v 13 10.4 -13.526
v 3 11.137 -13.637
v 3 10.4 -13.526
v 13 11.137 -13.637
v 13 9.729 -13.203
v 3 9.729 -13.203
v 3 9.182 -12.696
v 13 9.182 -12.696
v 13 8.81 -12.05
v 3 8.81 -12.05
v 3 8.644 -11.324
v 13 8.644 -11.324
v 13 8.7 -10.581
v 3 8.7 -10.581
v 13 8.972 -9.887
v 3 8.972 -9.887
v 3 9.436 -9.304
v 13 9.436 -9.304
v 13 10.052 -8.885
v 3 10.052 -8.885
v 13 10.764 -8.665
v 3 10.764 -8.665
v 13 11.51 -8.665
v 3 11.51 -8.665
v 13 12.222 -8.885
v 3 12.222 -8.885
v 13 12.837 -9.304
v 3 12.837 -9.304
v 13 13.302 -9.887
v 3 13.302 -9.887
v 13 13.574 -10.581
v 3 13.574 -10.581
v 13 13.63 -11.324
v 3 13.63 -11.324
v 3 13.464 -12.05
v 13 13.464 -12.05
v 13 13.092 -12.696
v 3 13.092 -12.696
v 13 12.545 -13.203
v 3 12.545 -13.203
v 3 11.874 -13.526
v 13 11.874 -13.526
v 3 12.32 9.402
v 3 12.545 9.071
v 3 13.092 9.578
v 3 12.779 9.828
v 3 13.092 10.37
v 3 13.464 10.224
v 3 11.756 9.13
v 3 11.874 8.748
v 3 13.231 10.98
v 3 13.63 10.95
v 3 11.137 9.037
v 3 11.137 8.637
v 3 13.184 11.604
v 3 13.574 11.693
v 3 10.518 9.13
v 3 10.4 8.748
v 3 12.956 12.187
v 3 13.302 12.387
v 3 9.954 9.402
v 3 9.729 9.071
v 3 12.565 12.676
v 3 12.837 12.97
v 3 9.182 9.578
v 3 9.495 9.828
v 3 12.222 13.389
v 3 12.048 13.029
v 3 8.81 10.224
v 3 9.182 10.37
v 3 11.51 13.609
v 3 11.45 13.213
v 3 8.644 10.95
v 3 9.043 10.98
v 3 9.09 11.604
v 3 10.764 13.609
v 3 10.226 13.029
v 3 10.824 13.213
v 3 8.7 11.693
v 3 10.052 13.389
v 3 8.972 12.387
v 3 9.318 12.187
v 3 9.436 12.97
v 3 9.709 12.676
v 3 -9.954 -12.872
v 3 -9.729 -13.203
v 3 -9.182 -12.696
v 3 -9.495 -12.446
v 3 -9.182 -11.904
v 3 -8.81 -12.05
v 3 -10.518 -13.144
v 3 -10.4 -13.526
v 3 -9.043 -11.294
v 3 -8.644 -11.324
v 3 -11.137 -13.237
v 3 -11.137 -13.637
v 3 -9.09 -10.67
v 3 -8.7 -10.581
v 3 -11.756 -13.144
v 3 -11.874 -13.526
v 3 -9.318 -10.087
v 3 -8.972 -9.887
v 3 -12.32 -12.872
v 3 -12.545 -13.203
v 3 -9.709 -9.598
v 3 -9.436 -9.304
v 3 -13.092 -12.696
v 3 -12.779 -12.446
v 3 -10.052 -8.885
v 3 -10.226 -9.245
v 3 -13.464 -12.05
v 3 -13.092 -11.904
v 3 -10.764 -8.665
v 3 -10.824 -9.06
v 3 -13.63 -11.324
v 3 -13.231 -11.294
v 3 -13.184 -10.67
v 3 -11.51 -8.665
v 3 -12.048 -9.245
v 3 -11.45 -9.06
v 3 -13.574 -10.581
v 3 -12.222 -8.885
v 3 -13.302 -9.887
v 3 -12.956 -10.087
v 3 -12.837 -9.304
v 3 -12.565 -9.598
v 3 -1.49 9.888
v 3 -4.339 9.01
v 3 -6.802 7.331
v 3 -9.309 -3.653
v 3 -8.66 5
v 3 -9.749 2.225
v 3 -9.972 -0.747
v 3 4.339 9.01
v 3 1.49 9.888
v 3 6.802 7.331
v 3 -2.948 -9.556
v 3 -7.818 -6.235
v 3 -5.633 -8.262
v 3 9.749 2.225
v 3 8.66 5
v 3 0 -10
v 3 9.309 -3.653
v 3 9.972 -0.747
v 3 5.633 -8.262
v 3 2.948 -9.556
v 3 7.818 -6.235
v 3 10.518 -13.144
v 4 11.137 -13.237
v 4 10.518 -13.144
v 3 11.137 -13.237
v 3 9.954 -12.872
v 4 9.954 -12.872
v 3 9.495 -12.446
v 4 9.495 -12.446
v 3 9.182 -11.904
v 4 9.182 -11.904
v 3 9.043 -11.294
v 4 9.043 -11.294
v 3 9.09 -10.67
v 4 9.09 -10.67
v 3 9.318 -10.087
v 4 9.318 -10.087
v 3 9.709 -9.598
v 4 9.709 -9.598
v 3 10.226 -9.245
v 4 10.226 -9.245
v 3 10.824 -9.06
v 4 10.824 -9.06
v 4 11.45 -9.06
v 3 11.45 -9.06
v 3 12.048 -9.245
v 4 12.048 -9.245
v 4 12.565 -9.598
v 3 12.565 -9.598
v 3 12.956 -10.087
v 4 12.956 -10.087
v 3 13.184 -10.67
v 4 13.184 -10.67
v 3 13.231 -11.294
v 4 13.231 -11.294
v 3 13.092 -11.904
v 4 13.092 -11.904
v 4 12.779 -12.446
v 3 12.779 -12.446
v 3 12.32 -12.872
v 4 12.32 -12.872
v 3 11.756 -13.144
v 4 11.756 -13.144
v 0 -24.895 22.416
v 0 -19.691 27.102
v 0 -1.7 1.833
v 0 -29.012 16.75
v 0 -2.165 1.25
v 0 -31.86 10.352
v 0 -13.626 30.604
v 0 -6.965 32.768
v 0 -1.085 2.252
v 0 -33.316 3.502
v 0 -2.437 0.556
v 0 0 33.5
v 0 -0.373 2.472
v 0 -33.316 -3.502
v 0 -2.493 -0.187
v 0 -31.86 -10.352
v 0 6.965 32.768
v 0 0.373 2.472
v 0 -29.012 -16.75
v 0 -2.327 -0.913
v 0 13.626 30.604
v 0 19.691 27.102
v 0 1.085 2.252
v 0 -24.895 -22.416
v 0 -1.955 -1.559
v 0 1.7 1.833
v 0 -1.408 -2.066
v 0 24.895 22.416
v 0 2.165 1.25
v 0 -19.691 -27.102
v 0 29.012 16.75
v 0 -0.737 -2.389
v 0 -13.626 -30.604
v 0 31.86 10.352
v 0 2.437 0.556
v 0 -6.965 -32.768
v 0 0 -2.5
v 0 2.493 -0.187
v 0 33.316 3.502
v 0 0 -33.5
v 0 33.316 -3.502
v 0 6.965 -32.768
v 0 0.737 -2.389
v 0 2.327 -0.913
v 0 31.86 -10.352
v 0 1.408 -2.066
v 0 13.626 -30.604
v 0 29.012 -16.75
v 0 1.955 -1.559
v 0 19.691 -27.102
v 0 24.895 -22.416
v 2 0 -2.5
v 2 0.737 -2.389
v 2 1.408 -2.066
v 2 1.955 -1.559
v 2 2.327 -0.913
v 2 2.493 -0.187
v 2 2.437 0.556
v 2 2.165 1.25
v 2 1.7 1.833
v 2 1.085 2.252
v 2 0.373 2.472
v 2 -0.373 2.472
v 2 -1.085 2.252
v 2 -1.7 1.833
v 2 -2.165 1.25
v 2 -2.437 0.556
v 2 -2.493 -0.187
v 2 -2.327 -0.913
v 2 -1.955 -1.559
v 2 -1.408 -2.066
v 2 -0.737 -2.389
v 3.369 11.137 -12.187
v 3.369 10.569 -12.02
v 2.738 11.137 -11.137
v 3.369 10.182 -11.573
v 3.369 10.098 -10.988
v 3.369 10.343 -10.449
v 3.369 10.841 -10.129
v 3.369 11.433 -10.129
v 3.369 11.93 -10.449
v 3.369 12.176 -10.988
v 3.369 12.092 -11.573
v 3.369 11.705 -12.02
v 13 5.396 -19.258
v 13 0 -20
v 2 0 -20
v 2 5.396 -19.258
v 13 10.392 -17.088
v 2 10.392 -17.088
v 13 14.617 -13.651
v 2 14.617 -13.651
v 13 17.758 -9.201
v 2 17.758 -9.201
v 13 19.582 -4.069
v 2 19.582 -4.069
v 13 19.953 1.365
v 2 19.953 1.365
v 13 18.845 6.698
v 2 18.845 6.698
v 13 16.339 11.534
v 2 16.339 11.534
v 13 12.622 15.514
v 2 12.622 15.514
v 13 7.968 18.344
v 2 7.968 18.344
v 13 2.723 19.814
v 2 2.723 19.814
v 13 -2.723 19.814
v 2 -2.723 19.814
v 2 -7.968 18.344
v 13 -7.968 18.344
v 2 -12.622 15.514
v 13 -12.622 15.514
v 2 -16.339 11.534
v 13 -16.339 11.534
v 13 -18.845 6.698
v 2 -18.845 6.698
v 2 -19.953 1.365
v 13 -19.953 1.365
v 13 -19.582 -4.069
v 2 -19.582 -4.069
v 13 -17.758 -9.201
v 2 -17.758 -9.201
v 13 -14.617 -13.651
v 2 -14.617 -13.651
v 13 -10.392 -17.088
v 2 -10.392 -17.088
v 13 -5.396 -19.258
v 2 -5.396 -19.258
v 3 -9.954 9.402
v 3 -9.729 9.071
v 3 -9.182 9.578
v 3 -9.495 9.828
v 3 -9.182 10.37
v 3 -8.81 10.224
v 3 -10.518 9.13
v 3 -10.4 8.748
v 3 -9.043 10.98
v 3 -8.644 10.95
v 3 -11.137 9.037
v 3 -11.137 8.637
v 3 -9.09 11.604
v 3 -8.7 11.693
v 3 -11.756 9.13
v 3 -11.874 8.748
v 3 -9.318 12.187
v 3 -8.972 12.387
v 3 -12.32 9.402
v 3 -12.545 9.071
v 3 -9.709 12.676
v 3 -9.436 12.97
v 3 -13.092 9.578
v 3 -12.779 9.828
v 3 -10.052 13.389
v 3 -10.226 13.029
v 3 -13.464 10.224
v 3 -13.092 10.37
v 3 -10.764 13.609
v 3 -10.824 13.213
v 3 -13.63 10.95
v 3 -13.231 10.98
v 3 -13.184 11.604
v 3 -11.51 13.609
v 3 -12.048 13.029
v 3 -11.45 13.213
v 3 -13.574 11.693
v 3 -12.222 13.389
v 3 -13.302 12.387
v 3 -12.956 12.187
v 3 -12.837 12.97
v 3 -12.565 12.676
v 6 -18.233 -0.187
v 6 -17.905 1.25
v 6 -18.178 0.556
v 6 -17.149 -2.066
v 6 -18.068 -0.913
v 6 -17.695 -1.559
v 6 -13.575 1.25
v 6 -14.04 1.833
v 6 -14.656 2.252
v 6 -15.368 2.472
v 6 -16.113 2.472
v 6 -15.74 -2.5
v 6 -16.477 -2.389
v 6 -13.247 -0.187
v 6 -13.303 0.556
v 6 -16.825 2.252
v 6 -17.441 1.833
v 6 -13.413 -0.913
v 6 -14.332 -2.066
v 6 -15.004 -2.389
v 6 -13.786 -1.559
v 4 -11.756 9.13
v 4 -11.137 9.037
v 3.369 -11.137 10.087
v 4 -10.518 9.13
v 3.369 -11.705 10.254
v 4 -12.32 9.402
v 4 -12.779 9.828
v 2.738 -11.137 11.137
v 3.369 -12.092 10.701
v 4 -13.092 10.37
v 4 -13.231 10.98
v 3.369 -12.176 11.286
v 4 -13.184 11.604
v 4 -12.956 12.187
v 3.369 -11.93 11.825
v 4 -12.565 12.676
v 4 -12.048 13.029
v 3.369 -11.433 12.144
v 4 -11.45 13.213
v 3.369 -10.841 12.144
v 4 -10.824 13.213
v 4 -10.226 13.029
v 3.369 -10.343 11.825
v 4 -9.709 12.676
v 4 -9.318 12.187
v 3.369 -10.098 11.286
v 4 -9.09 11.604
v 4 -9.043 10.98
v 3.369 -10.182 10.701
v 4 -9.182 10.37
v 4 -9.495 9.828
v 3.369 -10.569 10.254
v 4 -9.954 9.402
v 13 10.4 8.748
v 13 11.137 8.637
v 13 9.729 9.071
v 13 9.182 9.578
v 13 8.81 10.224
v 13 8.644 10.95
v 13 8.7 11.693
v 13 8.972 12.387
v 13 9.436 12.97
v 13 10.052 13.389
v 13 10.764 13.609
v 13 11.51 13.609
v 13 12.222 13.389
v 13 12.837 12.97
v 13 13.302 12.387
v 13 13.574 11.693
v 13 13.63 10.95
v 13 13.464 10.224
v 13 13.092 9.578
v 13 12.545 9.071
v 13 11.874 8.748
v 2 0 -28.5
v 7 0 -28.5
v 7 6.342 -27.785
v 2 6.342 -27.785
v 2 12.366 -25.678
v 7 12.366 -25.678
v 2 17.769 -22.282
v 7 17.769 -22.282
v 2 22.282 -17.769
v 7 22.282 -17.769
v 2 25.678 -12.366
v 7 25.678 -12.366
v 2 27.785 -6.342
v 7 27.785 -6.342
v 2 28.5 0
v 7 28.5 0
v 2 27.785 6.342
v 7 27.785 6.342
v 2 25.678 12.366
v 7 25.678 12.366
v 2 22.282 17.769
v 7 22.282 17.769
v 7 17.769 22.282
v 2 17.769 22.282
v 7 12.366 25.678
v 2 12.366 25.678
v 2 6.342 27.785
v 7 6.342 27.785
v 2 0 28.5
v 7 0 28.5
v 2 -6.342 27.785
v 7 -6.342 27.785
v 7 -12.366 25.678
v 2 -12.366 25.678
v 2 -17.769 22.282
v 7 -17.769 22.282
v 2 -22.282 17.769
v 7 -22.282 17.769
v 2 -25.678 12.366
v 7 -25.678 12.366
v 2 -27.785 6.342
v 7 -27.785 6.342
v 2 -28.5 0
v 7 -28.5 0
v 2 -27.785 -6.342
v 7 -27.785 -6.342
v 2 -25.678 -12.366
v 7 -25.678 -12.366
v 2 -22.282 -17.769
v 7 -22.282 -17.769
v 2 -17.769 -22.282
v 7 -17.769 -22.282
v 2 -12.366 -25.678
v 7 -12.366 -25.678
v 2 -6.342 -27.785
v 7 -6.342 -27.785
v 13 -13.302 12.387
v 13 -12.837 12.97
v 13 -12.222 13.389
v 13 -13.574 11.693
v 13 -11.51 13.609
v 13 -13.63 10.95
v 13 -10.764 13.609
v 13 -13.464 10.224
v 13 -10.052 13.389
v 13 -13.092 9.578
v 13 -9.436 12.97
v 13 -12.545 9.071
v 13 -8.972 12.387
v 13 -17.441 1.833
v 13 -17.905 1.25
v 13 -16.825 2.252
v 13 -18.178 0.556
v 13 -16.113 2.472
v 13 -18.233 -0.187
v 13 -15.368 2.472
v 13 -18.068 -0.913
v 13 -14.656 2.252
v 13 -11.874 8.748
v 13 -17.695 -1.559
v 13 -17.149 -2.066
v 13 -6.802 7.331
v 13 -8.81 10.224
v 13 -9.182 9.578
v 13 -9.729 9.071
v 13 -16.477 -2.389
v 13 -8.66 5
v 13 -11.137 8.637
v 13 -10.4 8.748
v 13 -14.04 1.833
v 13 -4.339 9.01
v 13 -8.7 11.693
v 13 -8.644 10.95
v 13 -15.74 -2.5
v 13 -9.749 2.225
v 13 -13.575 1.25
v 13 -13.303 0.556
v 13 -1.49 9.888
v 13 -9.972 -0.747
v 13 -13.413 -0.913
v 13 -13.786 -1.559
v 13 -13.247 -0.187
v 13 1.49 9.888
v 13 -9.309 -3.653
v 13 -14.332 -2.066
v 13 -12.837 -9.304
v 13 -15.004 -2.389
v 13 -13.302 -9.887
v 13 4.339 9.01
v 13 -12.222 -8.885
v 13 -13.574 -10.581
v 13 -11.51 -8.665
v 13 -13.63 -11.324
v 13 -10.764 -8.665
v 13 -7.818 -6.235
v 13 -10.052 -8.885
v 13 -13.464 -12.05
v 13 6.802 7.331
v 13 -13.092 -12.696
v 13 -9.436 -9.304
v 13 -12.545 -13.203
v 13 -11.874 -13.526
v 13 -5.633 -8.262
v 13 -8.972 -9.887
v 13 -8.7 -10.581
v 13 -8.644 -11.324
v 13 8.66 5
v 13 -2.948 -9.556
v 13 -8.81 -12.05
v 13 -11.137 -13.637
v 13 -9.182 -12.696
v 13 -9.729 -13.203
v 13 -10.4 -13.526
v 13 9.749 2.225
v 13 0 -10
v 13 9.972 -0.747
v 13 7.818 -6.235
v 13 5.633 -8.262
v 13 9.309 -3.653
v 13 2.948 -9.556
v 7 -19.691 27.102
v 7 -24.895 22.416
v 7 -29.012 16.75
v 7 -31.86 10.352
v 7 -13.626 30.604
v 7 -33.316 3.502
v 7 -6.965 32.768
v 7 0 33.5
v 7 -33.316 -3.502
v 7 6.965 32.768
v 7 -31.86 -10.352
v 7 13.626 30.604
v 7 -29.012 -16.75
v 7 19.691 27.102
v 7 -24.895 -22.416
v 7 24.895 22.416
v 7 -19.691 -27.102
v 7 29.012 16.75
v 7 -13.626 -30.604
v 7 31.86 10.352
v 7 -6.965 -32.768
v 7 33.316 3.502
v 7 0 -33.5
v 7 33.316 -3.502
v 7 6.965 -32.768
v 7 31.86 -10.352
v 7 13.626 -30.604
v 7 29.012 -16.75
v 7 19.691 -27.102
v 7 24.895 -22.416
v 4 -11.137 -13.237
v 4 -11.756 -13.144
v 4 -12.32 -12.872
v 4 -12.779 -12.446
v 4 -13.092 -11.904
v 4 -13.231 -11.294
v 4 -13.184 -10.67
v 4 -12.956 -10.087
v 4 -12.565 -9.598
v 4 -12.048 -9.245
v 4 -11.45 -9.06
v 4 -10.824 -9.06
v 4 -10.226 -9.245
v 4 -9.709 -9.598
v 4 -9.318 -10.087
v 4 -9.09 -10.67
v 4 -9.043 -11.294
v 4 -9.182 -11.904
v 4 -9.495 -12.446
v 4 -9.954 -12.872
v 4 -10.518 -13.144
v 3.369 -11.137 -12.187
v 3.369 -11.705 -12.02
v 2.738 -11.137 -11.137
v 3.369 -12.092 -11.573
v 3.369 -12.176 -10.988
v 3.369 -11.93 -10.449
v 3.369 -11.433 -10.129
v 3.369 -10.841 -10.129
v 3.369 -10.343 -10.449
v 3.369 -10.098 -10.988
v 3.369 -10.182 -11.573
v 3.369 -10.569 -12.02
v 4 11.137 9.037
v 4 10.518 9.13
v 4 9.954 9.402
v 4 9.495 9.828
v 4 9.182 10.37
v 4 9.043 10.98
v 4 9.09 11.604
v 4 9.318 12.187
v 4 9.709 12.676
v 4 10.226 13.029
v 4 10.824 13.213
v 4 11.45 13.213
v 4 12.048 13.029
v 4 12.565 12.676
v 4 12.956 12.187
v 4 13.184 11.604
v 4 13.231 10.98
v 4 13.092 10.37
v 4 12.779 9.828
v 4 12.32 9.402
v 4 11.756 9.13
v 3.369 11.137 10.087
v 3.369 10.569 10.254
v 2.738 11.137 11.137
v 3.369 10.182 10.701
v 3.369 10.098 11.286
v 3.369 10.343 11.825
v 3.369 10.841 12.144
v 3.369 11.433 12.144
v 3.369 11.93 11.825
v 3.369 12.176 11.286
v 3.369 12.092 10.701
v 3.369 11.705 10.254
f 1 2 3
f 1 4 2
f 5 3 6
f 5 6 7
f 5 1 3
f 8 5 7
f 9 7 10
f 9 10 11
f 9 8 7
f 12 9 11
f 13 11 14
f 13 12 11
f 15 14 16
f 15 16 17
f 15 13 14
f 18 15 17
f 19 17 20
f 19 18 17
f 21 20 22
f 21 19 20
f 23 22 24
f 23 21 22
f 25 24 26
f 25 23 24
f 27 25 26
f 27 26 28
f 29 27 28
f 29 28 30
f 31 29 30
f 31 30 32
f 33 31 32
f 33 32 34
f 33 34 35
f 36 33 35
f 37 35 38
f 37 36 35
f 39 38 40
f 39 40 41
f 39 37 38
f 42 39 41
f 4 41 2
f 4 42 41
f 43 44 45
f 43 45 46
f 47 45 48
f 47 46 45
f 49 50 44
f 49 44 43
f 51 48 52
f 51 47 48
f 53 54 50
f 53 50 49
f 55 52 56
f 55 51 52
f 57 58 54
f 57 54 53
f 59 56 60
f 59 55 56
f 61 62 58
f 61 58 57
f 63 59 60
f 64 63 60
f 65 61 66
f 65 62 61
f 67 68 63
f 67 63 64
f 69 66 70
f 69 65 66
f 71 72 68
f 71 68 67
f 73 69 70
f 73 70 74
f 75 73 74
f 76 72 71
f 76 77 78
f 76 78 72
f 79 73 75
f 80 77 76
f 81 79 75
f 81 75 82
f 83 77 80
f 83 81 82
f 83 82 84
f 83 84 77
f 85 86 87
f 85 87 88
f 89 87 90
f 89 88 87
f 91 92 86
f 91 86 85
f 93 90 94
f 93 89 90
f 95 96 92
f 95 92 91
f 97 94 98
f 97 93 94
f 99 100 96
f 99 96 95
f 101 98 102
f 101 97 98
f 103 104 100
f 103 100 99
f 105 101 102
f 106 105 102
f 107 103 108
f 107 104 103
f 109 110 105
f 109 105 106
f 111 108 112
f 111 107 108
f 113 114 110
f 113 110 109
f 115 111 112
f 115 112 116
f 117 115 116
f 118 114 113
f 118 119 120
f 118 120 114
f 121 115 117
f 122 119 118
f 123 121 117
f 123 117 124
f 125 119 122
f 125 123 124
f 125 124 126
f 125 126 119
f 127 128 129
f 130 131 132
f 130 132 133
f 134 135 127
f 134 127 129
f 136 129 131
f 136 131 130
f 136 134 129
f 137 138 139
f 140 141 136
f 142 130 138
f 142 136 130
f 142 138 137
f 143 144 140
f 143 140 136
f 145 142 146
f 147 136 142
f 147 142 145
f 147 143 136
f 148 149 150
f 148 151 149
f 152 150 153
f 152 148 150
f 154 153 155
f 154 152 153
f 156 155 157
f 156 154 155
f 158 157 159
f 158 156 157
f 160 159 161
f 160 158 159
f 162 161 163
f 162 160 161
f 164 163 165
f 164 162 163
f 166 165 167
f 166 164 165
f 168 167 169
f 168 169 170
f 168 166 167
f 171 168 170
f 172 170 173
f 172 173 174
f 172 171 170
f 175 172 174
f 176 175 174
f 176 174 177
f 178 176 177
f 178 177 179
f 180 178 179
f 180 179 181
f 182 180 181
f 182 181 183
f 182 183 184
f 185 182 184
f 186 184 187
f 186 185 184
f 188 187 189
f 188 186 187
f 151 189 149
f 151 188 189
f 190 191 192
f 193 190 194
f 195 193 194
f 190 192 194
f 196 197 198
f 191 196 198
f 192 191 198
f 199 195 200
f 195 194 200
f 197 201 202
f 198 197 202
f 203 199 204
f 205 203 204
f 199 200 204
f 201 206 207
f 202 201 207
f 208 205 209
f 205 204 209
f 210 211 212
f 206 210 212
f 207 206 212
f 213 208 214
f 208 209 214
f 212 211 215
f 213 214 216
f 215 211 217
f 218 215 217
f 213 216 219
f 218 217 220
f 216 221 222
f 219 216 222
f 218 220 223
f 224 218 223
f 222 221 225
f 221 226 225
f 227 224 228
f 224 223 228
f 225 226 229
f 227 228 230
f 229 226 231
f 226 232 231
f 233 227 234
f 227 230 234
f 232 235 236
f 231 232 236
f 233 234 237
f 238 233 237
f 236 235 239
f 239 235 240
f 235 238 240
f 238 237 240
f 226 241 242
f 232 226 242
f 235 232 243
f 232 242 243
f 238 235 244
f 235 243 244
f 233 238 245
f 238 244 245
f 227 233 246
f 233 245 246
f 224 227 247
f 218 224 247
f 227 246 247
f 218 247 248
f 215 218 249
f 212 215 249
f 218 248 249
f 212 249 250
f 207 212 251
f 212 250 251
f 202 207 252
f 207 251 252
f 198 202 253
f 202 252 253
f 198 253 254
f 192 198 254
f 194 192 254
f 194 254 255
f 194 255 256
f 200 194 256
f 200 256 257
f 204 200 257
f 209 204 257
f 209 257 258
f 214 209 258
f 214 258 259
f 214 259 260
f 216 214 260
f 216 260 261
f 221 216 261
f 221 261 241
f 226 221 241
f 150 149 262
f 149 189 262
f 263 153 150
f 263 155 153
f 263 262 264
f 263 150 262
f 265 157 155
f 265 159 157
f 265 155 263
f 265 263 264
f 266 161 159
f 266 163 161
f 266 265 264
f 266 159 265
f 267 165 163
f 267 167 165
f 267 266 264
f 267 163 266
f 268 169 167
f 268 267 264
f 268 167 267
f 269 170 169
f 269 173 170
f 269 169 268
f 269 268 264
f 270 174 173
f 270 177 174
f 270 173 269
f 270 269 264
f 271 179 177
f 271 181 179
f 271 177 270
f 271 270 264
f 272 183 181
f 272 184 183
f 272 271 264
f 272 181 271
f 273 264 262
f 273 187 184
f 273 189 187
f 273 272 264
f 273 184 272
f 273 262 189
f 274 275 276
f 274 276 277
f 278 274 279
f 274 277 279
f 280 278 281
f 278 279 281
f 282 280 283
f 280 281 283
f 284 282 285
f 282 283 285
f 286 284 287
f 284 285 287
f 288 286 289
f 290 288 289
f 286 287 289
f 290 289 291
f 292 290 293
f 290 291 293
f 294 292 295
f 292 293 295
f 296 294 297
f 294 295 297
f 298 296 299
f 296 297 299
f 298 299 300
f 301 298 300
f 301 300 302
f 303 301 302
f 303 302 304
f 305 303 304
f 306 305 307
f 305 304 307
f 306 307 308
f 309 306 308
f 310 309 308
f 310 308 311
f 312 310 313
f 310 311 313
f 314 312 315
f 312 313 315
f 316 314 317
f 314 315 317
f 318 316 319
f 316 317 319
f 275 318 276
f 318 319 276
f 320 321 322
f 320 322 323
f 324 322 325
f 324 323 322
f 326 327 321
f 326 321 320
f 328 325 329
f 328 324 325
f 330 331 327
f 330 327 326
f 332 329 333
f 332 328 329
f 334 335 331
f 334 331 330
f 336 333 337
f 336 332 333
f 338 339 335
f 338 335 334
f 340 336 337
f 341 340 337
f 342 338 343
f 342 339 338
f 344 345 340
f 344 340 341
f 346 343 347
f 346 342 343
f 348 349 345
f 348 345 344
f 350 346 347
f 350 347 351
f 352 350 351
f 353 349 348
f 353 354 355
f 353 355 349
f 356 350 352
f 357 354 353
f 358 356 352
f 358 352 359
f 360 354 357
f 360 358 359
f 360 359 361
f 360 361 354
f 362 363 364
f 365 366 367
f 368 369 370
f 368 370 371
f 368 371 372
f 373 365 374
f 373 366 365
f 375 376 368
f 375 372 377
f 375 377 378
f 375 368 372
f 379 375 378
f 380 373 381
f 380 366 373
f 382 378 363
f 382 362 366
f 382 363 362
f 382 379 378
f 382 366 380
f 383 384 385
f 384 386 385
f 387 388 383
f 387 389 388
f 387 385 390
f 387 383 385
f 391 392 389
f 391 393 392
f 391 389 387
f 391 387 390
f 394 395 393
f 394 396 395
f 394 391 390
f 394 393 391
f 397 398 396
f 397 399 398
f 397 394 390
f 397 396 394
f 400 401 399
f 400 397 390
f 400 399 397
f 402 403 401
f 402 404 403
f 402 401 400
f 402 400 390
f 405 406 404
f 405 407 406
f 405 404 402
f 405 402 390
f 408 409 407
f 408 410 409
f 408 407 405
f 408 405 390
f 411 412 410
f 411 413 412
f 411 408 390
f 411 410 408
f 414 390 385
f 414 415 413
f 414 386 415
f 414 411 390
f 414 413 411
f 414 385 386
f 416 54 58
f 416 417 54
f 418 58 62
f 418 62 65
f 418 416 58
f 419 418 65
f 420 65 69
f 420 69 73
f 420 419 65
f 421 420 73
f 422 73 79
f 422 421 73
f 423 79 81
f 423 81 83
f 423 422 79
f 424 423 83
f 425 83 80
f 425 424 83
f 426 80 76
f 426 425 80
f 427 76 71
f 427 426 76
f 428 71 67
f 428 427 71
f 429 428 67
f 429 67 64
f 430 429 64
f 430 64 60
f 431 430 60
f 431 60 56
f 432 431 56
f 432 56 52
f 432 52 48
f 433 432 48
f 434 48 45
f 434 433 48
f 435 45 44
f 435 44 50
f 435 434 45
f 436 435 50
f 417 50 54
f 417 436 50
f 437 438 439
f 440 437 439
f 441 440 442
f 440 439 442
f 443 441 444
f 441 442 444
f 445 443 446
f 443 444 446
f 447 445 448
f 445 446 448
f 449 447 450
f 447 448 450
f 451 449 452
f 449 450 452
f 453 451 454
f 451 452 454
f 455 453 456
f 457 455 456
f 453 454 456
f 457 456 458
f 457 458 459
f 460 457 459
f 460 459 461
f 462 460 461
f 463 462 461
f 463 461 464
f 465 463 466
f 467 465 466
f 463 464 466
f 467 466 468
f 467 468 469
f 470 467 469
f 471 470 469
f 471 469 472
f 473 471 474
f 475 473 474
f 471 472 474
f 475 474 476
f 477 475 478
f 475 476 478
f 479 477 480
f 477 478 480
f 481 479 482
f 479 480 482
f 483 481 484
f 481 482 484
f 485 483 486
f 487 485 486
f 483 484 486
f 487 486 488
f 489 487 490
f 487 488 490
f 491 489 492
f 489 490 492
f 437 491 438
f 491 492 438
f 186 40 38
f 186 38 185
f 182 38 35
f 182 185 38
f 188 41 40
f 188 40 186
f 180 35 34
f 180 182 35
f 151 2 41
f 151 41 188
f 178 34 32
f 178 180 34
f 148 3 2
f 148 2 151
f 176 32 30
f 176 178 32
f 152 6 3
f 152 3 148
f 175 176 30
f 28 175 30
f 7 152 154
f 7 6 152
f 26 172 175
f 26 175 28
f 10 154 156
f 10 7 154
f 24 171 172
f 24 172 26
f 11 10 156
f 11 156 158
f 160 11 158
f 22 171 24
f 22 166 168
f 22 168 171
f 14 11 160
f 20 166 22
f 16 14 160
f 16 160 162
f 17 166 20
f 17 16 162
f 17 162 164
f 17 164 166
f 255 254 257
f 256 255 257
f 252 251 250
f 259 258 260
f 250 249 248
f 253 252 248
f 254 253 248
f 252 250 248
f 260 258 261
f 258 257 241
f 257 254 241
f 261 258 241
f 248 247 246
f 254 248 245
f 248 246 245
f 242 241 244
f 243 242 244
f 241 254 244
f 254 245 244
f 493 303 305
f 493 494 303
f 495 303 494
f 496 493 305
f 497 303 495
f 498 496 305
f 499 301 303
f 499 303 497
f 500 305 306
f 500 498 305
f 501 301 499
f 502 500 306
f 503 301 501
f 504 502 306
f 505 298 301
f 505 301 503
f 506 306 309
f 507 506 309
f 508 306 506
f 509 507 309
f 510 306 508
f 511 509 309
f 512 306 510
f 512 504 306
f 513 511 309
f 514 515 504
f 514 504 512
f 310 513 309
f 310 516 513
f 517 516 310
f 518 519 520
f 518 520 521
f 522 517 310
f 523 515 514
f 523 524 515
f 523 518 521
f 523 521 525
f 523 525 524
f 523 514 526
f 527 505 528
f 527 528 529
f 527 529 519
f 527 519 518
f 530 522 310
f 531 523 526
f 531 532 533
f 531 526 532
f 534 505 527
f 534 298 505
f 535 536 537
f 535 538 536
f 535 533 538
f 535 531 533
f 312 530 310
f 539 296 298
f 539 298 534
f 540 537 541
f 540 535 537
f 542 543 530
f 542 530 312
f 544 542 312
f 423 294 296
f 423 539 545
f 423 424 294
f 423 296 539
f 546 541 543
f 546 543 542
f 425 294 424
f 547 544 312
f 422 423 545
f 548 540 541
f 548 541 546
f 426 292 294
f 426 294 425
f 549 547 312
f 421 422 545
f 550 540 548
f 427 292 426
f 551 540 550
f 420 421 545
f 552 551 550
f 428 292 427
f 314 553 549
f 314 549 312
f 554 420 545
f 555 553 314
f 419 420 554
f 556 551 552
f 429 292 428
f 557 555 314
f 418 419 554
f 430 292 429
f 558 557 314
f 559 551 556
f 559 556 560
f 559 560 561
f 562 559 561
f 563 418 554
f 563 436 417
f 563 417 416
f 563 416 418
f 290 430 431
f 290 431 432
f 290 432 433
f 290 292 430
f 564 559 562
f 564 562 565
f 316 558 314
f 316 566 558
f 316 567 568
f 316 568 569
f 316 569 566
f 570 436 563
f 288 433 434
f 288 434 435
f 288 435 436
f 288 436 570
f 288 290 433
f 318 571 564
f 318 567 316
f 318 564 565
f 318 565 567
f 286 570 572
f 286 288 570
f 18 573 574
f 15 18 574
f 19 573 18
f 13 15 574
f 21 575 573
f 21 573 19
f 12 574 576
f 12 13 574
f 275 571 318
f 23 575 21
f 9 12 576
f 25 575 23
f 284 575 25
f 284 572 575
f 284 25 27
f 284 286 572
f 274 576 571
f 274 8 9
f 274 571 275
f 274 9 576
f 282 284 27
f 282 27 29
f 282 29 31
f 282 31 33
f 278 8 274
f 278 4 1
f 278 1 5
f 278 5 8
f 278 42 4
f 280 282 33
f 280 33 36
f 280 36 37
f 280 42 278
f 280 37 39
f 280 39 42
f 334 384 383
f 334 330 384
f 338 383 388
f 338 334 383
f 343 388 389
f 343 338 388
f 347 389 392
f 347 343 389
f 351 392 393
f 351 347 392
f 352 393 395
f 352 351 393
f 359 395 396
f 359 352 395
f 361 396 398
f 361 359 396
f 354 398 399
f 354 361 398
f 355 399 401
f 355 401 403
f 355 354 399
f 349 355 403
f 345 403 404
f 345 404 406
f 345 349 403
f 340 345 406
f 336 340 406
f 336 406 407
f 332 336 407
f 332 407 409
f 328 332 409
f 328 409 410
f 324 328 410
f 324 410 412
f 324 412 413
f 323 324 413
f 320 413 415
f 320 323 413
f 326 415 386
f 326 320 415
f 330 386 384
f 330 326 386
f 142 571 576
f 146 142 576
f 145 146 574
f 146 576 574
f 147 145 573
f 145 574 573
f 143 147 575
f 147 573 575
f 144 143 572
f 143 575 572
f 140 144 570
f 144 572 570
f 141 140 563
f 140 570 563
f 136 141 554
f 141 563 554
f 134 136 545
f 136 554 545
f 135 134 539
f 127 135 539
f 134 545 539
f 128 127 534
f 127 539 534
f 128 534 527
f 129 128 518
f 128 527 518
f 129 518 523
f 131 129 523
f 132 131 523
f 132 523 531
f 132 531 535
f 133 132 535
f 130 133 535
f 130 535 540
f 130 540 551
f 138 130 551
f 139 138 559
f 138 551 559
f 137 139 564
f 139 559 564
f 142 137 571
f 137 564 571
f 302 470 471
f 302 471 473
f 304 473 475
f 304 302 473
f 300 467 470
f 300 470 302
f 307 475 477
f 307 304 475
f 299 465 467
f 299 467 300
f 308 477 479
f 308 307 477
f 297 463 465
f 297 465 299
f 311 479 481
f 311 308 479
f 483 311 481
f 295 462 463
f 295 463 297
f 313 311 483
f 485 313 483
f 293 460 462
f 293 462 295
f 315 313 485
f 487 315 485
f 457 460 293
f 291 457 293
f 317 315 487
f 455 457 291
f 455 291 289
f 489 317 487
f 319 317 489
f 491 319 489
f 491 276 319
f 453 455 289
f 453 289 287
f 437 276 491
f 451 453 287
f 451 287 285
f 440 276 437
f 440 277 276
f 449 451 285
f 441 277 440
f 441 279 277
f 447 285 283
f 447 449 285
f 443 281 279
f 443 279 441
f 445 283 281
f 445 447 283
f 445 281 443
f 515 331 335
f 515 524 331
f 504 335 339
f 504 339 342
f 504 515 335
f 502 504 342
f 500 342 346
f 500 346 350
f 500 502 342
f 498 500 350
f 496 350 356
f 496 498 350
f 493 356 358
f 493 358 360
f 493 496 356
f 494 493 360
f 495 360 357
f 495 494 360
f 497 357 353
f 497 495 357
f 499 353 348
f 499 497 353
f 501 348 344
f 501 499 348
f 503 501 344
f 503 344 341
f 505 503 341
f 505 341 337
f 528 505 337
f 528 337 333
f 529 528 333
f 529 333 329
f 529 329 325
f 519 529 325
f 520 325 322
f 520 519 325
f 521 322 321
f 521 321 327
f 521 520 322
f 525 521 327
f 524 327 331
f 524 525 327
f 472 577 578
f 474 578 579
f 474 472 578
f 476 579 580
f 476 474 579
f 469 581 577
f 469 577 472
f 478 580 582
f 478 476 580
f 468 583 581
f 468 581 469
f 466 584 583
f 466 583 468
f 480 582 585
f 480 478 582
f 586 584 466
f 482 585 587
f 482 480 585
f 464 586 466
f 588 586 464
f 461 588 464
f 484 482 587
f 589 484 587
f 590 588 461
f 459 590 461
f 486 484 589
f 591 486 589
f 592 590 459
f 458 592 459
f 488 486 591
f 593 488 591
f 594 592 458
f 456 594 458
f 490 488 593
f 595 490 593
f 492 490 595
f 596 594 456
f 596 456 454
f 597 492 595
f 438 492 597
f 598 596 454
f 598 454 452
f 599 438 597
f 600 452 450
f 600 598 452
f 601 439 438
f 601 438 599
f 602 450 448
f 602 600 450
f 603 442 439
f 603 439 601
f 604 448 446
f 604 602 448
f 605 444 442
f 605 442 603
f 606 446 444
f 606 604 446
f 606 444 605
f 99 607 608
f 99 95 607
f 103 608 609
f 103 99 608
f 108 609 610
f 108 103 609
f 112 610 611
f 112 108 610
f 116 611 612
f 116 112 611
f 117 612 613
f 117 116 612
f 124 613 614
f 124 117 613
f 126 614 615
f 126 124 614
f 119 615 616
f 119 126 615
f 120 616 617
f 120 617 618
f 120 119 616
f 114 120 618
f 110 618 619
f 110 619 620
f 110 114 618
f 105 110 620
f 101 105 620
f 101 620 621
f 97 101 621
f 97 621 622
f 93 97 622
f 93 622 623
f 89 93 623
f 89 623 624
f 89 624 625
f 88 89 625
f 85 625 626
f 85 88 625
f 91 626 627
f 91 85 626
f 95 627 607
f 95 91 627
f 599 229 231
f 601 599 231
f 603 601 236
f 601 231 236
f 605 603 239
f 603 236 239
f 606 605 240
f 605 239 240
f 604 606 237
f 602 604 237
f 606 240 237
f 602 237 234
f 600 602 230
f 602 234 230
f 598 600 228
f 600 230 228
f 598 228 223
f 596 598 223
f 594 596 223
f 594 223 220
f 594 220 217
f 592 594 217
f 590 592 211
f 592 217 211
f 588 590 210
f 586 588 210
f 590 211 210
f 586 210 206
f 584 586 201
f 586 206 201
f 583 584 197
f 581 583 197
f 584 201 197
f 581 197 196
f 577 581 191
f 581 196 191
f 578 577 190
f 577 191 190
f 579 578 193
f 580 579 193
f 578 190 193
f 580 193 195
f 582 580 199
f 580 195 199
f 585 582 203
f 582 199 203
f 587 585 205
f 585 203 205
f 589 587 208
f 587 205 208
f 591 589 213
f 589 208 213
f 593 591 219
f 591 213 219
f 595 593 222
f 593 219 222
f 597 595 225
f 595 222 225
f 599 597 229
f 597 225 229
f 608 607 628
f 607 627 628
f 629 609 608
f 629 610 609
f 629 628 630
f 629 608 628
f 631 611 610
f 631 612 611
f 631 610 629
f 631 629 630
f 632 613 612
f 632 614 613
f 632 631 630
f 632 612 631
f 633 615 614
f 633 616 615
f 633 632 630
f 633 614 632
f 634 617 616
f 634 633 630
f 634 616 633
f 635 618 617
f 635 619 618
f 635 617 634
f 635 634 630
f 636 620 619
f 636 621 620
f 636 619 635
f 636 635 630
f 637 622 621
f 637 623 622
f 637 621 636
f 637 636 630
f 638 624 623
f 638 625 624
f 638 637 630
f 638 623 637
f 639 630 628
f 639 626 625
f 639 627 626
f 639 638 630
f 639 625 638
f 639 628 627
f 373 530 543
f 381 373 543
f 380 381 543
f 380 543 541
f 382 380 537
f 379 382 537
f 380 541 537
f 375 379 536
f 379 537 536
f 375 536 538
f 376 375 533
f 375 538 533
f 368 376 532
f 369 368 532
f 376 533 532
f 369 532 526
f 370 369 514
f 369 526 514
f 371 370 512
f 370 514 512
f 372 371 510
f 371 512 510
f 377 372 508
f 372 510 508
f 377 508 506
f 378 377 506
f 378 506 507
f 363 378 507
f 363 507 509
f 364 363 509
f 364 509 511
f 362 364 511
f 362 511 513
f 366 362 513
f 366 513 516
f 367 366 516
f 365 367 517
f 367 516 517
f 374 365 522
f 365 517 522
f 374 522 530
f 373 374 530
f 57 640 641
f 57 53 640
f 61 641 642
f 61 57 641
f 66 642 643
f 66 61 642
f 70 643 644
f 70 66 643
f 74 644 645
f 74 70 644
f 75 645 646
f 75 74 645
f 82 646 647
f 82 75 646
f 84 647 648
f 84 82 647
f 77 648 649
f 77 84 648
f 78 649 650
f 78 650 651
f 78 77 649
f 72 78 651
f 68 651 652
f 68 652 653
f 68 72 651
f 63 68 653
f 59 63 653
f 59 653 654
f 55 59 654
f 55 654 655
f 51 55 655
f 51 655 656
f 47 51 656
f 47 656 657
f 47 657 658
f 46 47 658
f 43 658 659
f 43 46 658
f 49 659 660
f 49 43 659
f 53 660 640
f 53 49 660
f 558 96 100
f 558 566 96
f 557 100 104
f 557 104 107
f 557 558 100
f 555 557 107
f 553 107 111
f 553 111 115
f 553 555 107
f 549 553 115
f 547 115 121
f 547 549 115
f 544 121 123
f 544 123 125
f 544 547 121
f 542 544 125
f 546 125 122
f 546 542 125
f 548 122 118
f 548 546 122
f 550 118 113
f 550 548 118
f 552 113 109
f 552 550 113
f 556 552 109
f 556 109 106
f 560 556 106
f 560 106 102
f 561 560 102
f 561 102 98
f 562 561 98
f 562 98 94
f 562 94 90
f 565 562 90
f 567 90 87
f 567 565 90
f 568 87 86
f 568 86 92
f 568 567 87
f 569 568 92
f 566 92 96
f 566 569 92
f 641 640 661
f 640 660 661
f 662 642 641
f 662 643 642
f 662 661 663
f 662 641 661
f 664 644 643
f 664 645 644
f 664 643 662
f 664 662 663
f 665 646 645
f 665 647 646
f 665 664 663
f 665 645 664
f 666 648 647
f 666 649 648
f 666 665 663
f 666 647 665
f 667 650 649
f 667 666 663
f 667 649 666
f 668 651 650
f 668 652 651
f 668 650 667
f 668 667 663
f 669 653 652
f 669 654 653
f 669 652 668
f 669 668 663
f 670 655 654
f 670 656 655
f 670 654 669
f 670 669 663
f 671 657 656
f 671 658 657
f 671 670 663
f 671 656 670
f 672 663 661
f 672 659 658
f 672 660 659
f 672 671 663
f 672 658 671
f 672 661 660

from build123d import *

# Parameters (mm, degrees)
SKETCH_1_R          = 33.5
EXTRUDE_1_DEPTH     = 7
SKETCH_3_R          = 28.5
CUT_EXTRUDE_1_DEPTH = 5
SKETCH_4_R          = 2.5
CUT_EXTRUDE_2_DEPTH = 5
SKETCH_5_R          = 20
EXTRUDE_2_DEPTH     = 11
SKETCH_6_R          = 10
CUT_EXTRUDE_5_DEPTH = 10
M5X0_8_1_AT_2_COUNT = 2
M5X0_8_1_AT_2_PITCH = 31.5
M5X0_8_1_AT_3_COUNT = 2
M5X0_8_1_AT_3_PITCH = 22.273863607
M5X0_8_1_AT_4_COUNT = 2
M5X0_8_1_AT_4_PITCH = 22.273863607
SKETCH_7_R          = 2.5
CUT_EXTRUDE_6_DEPTH = 7


with BuildPart() as part:
    # ｽｹｯﾁ1 → 押し出し1 (new body)
    with BuildSketch(Plane(origin=(0, 0, 0), x_dir=(0, 0, -1), z_dir=(1, 0, 0))):
        Circle(SKETCH_1_R)
    extrude(amount=EXTRUDE_1_DEPTH)

    # ｽｹｯﾁ3 → ｶｯﾄ - 押し出し1 (cut)
    with BuildSketch(Plane(origin=(7, 0, 0), x_dir=(0, 0, -1), z_dir=(1, 0, 0))):
        Circle(SKETCH_3_R)
    extrude(amount=-CUT_EXTRUDE_1_DEPTH, mode=Mode.SUBTRACT)

    # ｽｹｯﾁ4 → ｶｯﾄ - 押し出し2 (cut)
    with BuildSketch(Plane(origin=(2, 0, 0), x_dir=(0, 0, -1), z_dir=(1, 0, 0))):
        Circle(SKETCH_4_R)
    extrude(amount=-CUT_EXTRUDE_2_DEPTH, mode=Mode.SUBTRACT)

    # ｽｹｯﾁ5 → 押し出し2 (add)
    with BuildSketch(Plane(origin=(2, 0, 0), x_dir=(0, 0, -1), z_dir=(1, 0, 0))):
        Circle(SKETCH_5_R)
    extrude(amount=EXTRUDE_2_DEPTH)

    # ｽｹｯﾁ6 → ｶｯﾄ - 押し出し5 (cut)
    with BuildSketch(Plane(origin=(13, 0, 0), x_dir=(0, 0, -1), z_dir=(1, 0, 0))):
        Circle(SKETCH_6_R)
    extrude(amount=-CUT_EXTRUDE_5_DEPTH, mode=Mode.SUBTRACT)

    # ｽｹｯﾁ10 → M5x0.8 ねじ穴1 (revolve, cut)
    with BuildSketch(Plane(origin=(13, 11.136931804, 11.136931804), x_dir=(0, 0, -1), z_dir=(0, 1, 0))):
        Polygon((0, 0), (0, 10.2618073), (2.1, 9), (2.1, 10), (2.5, 10), (2.5, 0), align=None)
    m5x0_8_1 = revolve(axis=Axis((19.35, 11.136931804, 11.136931804), (-1, 0, 0)), mode=Mode.SUBTRACT)

    # M5x0.8 ねじ穴1 at 2: M5x0.8 ねじ穴1 ×2
    with Locations(*[Vector(0, -0.7071067811865511, -0.707106781186544) * (i * M5X0_8_1_AT_2_PITCH) for i in range(1, M5X0_8_1_AT_2_COUNT)]):
        add(m5x0_8_1, mode=Mode.SUBTRACT)

    # M5x0.8 ねじ穴1 at 3: M5x0.8 ねじ穴1 ×2
    with Locations(*[(0, -i * M5X0_8_1_AT_3_PITCH, 0) for i in range(1, M5X0_8_1_AT_3_COUNT)]):
        add(m5x0_8_1, mode=Mode.SUBTRACT)

    # M5x0.8 ねじ穴1 at 4: M5x0.8 ねじ穴1 ×2
    with Locations(*[(0, 0, -i * M5X0_8_1_AT_4_PITCH) for i in range(1, M5X0_8_1_AT_4_COUNT)]):
        add(m5x0_8_1, mode=Mode.SUBTRACT)

    # ｽｹｯﾁ7 → ｶｯﾄ - 押し出し6 (cut)
    with BuildSketch(Plane(origin=(13, 0, 0), x_dir=(0, 0, -1), z_dir=(1, 0, 0))):
        with Locations((0, -15.740397433)):
            Circle(SKETCH_7_R)
    extrude(amount=-CUT_EXTRUDE_6_DEPTH, mode=Mode.SUBTRACT)


solid = part.part
